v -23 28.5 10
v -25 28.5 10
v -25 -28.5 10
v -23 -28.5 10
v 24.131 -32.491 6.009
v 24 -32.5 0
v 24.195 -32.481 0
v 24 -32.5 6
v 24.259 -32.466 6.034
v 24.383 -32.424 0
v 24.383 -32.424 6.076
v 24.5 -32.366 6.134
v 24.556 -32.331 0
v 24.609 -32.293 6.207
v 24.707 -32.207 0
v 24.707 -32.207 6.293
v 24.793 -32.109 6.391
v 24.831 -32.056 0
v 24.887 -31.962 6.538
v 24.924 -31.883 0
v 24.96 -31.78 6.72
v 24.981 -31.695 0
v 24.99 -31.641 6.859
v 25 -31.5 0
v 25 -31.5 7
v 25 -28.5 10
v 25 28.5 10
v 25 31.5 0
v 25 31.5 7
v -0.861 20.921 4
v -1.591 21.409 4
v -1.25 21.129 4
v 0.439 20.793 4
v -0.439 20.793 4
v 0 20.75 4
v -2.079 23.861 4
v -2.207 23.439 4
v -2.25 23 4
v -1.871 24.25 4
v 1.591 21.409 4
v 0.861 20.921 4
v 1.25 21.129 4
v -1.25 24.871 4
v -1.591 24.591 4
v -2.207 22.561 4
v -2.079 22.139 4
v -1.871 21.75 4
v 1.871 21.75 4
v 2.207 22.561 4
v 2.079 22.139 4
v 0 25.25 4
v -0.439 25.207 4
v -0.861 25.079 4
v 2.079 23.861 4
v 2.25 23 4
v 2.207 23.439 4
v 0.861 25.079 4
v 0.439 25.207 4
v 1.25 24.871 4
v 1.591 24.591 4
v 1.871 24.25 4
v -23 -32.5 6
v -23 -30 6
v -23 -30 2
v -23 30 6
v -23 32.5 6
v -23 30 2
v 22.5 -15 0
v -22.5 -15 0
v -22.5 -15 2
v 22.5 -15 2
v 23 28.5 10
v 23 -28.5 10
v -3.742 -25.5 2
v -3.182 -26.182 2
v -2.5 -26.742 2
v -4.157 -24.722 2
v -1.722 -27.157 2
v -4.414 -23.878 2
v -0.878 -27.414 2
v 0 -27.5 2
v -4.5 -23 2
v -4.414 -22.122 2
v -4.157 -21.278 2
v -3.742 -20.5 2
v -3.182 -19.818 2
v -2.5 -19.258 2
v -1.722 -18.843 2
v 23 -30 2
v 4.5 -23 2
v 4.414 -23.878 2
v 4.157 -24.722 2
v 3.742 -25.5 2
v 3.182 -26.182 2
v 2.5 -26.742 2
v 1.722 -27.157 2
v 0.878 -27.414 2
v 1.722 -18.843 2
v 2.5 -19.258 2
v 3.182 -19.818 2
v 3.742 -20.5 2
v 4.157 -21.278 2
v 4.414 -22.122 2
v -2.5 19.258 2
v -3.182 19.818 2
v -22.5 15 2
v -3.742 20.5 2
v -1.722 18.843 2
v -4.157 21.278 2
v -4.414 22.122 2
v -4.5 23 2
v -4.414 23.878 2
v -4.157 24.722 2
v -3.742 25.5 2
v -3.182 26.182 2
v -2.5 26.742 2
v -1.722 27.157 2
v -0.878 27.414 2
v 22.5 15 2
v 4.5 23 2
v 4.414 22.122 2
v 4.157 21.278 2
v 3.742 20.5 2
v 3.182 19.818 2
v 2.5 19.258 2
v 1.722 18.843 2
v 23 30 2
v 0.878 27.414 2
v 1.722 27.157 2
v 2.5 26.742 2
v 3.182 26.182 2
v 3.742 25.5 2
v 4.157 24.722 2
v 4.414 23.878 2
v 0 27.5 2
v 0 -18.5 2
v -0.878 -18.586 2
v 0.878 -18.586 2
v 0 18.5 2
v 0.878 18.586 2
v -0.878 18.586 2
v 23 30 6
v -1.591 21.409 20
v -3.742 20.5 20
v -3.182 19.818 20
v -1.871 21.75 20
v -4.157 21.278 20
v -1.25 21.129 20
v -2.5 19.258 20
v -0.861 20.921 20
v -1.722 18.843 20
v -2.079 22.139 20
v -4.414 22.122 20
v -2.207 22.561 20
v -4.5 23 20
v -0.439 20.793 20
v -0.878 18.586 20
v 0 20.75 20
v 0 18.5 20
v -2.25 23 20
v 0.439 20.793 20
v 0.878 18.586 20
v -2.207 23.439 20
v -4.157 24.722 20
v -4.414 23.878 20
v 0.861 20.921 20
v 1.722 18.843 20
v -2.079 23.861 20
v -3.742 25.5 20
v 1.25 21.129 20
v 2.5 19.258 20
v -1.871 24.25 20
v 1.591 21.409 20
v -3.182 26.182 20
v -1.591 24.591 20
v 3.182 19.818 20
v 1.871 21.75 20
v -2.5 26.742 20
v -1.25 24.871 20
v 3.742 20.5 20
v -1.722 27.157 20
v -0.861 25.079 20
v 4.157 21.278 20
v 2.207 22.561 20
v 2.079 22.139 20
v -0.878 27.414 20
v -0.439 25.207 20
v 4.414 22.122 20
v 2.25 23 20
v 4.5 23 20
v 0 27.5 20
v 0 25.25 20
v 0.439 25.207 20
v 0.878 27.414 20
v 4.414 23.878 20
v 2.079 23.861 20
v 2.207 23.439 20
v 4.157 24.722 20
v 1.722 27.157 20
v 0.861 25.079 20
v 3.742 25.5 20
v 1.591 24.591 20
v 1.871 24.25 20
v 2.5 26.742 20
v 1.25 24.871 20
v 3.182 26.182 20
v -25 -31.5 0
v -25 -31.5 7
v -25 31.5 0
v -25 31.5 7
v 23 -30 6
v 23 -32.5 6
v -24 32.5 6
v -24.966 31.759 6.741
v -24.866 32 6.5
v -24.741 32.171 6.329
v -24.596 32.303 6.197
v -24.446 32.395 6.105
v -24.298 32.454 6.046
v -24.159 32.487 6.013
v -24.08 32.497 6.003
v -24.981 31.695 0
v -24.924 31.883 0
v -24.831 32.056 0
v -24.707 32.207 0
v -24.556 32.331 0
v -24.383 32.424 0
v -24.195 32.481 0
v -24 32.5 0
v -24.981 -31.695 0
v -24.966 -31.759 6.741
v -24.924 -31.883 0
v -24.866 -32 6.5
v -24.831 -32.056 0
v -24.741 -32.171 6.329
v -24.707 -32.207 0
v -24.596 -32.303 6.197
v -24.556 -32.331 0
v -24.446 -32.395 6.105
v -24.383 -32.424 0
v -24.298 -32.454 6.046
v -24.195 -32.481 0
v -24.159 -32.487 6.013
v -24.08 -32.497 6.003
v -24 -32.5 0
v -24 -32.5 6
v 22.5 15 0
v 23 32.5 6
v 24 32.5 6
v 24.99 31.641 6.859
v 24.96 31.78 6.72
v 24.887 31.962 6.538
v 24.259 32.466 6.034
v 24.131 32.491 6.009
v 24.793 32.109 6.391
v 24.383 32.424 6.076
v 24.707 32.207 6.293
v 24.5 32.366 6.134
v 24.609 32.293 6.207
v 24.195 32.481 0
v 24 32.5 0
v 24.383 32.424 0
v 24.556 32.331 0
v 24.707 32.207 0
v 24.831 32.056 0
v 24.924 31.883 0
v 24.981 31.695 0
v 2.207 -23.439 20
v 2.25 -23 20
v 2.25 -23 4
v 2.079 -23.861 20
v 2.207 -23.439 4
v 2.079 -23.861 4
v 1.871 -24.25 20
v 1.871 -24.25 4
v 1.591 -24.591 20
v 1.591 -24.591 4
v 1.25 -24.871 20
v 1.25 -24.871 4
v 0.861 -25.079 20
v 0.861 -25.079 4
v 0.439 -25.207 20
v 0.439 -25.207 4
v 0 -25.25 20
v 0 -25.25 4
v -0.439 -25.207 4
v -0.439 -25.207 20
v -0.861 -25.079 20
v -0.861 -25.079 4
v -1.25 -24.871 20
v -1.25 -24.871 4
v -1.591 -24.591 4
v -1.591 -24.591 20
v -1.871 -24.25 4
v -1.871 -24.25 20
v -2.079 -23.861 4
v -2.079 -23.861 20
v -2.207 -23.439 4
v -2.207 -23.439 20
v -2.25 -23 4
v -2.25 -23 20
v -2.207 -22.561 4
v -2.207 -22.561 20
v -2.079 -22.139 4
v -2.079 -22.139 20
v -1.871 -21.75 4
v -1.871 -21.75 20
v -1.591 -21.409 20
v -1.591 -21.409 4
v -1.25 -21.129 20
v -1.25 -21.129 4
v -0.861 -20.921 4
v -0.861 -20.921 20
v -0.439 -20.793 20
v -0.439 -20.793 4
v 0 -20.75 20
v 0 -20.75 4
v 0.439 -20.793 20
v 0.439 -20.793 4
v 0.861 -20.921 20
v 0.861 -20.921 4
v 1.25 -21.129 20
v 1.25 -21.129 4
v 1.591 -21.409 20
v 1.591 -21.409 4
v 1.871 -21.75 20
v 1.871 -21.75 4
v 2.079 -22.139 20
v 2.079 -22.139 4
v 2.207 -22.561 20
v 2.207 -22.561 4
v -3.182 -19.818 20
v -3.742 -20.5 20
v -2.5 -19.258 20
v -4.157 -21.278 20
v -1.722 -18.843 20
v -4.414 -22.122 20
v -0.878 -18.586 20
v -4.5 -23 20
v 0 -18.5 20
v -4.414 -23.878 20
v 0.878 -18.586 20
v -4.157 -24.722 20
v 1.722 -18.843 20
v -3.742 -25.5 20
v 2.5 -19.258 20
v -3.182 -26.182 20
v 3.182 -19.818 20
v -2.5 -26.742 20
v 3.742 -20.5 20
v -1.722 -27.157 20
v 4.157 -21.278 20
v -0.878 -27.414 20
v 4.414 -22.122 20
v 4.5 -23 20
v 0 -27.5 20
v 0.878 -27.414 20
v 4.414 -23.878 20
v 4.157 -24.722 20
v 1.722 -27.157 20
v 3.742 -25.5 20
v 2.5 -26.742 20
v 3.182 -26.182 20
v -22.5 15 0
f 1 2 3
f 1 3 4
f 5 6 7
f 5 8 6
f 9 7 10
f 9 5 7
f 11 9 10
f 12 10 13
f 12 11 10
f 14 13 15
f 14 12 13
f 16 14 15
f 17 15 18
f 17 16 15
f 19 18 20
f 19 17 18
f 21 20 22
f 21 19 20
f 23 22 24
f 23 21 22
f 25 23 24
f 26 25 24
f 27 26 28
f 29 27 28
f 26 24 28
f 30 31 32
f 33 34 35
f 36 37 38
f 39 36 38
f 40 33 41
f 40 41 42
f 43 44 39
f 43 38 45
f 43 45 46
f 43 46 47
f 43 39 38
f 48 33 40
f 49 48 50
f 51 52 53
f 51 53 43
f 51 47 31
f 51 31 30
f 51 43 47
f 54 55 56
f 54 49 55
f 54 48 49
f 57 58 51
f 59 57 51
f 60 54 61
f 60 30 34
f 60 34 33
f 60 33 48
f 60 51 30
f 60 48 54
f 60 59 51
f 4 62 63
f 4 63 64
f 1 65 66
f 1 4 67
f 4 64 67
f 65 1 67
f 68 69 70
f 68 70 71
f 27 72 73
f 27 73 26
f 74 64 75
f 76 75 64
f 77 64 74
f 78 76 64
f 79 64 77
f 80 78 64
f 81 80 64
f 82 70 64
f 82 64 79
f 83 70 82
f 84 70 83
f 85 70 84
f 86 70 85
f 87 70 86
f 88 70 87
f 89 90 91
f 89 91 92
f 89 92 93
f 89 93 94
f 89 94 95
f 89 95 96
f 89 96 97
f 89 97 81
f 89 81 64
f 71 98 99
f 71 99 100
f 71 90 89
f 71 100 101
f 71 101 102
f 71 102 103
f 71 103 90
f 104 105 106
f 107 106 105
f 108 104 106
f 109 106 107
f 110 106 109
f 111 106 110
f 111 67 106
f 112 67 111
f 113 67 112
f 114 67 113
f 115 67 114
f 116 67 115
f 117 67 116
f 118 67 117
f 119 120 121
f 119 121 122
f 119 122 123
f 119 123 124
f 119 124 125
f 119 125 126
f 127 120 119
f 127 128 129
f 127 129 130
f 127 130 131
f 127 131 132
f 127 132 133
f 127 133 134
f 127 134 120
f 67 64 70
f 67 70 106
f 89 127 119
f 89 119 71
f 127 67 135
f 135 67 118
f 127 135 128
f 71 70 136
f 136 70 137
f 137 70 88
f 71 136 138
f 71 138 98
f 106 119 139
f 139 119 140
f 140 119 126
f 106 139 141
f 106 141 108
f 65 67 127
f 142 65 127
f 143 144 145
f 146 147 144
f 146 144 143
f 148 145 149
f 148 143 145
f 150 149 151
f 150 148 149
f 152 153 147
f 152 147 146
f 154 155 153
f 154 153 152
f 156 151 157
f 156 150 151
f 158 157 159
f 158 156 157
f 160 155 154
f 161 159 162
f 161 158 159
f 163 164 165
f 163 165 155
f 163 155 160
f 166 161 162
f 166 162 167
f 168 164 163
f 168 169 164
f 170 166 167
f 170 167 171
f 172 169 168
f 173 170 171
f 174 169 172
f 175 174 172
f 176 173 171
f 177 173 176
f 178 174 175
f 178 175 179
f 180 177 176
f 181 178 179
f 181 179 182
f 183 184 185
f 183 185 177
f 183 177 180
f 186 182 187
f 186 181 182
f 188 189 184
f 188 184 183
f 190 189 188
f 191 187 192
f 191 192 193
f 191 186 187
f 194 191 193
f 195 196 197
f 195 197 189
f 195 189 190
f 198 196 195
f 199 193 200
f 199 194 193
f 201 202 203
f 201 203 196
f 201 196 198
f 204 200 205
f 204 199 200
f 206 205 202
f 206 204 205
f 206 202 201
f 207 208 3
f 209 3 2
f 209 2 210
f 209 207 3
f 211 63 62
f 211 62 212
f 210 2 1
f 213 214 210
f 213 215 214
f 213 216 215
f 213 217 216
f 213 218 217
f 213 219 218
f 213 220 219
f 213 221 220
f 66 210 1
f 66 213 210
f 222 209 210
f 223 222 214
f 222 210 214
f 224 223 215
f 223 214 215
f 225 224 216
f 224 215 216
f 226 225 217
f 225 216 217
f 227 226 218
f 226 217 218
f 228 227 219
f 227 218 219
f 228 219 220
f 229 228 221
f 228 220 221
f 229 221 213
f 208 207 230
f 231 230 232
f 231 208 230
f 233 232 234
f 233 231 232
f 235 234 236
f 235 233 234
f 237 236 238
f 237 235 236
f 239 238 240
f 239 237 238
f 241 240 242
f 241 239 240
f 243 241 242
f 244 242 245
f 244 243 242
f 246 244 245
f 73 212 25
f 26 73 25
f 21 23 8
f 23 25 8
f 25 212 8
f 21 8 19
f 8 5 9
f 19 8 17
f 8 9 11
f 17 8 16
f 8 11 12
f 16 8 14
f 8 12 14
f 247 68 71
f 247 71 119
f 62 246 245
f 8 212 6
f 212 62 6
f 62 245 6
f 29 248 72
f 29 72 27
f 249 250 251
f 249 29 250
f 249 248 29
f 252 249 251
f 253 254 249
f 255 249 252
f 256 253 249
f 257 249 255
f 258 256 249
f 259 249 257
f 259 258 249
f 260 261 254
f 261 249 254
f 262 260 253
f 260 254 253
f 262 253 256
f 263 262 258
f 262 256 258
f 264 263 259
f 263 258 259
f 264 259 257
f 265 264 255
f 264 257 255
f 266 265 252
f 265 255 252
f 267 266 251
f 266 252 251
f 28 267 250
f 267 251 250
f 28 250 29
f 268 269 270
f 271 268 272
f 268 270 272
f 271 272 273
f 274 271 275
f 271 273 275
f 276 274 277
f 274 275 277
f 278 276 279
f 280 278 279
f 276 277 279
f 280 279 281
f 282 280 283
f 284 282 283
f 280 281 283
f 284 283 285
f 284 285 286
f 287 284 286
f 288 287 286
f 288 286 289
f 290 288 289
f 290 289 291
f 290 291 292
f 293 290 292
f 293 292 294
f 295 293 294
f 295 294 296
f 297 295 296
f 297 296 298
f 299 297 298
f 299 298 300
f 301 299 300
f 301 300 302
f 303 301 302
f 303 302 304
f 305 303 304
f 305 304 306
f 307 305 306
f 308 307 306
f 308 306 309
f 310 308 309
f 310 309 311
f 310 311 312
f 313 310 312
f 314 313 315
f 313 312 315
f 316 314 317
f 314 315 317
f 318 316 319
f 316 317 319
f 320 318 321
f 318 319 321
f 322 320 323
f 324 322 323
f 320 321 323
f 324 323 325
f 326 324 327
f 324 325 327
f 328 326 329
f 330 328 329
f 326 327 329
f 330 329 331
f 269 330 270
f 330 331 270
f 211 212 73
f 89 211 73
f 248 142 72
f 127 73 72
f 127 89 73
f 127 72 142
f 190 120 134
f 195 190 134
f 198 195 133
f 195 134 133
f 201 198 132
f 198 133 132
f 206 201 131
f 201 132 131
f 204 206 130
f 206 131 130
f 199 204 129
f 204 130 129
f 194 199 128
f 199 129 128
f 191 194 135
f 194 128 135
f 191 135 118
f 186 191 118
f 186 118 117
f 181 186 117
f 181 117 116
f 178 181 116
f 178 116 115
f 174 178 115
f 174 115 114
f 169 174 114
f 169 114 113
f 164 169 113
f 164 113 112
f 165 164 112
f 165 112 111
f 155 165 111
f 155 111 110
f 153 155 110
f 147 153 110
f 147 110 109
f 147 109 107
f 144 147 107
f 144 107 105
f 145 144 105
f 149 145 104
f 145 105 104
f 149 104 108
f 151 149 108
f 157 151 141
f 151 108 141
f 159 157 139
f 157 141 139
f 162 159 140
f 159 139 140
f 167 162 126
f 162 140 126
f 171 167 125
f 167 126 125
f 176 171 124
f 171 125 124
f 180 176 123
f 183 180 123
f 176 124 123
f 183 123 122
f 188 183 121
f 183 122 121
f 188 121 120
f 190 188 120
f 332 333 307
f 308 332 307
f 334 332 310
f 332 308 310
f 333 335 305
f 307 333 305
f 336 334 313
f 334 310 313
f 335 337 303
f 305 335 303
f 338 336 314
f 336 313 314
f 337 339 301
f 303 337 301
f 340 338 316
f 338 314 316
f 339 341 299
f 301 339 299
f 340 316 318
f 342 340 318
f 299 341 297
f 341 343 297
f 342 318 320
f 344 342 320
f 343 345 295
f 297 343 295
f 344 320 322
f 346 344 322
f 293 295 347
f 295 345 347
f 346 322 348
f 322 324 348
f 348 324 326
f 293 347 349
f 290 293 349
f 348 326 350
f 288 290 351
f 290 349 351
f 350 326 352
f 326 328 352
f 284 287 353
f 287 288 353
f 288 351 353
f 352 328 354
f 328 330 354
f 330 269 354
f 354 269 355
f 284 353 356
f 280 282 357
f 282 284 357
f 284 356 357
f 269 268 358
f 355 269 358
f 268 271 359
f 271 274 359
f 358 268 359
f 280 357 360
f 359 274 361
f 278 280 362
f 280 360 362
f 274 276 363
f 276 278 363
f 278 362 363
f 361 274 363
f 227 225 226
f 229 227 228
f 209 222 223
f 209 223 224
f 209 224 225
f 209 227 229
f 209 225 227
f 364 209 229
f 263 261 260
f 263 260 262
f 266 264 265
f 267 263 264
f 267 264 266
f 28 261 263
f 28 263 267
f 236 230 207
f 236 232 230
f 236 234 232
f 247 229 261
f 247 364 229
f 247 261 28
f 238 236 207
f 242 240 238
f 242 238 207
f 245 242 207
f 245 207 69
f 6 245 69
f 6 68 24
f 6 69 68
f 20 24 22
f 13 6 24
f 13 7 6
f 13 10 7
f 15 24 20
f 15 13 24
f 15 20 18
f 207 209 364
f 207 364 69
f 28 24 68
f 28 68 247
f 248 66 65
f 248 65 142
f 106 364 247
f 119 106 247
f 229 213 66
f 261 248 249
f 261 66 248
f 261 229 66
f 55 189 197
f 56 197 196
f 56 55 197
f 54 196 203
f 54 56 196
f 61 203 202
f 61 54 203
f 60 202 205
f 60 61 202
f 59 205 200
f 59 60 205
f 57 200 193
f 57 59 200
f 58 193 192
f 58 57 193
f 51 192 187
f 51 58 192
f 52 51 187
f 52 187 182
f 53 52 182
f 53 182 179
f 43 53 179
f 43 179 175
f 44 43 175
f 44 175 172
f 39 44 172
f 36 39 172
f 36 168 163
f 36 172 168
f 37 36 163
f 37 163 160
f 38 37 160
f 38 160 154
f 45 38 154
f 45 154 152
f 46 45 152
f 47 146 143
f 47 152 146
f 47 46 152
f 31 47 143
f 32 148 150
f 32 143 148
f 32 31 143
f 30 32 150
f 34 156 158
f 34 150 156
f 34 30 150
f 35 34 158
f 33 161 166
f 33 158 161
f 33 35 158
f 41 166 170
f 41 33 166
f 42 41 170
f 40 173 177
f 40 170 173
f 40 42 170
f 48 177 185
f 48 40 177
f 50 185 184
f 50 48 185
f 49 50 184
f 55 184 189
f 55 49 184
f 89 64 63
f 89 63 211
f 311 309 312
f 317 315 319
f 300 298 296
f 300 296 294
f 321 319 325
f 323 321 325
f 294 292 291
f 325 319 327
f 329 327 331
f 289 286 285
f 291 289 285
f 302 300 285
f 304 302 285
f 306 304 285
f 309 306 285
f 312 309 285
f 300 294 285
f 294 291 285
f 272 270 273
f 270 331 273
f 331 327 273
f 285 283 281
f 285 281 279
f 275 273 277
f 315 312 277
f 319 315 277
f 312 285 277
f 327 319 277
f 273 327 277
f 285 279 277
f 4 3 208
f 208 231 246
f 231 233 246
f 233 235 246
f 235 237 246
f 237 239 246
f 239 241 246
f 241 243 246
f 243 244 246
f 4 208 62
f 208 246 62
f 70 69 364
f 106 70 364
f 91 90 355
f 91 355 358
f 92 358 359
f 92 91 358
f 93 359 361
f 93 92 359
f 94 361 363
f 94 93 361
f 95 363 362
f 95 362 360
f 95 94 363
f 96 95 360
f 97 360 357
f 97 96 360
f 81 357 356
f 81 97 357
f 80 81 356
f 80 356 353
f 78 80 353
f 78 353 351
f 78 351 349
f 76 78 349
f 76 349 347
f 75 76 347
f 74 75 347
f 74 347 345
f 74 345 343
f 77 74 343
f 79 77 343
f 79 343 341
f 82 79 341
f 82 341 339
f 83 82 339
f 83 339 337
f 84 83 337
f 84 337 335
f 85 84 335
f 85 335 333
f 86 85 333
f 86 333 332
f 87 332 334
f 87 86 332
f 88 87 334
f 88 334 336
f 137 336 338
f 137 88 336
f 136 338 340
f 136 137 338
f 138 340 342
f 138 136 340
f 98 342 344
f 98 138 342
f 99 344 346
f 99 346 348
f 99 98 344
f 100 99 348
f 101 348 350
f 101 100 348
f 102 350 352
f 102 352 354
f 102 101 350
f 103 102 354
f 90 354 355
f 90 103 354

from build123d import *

# Parameters (mm, degrees)
SKETCH025_W       = 50
SKETCH025_H       = 65
PAD015_DEPTH      = 10
SKETCH026_W       = 45
SKETCH026_H       = 30
POCKET008_DEPTH   = 10.001
SKETCH027_W       = 46
SKETCH027_H       = 60
POCKET009_DEPTH   = 8.001
SKETCH028_W       = 46
SKETCH028_H       = 100
POCKET010_DEPTH   = 5
CHAMFER002_SIZE   = 4
FILLET_R          = 1
CYLINDER004_R     = 4.5
CYLINDER004_DEPTH = 20
CYLINDER005_R     = 2.25
CYLINDER005_DEPTH = 20


with BuildPart() as part:
    # Sketch025 → Pad015 (new body)
    with BuildSketch(Plane.XY):
        Rectangle(SKETCH025_W, SKETCH025_H)
    extrude(amount=PAD015_DEPTH)

    # Sketch026 → Pocket008 (cut, through all)
    with BuildSketch(Plane.XY):
        Rectangle(SKETCH026_W, SKETCH026_H)
    extrude(amount=POCKET008_DEPTH, mode=Mode.SUBTRACT)

    # Sketch027 → Pocket009 (cut, through all)
    with BuildSketch(Plane.XY.offset(2)):
        Rectangle(SKETCH027_W, SKETCH027_H)
    extrude(amount=POCKET009_DEPTH, mode=Mode.SUBTRACT)

    # Sketch028 → Pocket010 (cut)
    with BuildSketch(Plane.XY.offset(6)):
        Rectangle(SKETCH028_W, SKETCH028_H)
    extrude(amount=POCKET010_DEPTH, mode=Mode.SUBTRACT)

    # Chamfer002
    chamfer002_edges = [part.edges().sort_by_distance(p)[0] for p in [
        (-24, -32.5, 10),
        (24, -32.5, 10),
        (24, 32.5, 10),
        (-24, 32.5, 10),
    ]]
    chamfer(chamfer002_edges, length=CHAMFER002_SIZE)

    # Fillet
    fillet_edges = [part.edges().sort_by_distance(p)[0] for p in [
        (25, 32.5, 3),
        (25, -32.5, 3),
        (-25, 32.5, 3),
        (-25, -32.5, 3),
    ]]
    fillet(fillet_edges, radius=FILLET_R)

    # Cylinder004 → Cylinder004 (join)
    with BuildSketch(Plane(origin=(0, 23, 0), x_dir=(1, 0, 0), z_dir=(0, 0, 1))):
        Circle(CYLINDER004_R)
    cylinder004 = extrude(amount=CYLINDER004_DEPTH)

    # Cylinder005 → Cylinder005 (cut)
    with BuildSketch(Plane(origin=(0, 23, 4), x_dir=(1, 0, 0), z_dir=(0, 0, 1))):
        Circle(CYLINDER005_R)
    cylinder005 = extrude(amount=CYLINDER005_DEPTH, mode=Mode.SUBTRACT)

    # Mirrored012: Cylinder004, Cylinder005 across XZ
    add(cylinder004.mirror(Plane.XZ))
    add(cylinder005.mirror(Plane.XZ), mode=Mode.SUBTRACT)


solid = part.part
